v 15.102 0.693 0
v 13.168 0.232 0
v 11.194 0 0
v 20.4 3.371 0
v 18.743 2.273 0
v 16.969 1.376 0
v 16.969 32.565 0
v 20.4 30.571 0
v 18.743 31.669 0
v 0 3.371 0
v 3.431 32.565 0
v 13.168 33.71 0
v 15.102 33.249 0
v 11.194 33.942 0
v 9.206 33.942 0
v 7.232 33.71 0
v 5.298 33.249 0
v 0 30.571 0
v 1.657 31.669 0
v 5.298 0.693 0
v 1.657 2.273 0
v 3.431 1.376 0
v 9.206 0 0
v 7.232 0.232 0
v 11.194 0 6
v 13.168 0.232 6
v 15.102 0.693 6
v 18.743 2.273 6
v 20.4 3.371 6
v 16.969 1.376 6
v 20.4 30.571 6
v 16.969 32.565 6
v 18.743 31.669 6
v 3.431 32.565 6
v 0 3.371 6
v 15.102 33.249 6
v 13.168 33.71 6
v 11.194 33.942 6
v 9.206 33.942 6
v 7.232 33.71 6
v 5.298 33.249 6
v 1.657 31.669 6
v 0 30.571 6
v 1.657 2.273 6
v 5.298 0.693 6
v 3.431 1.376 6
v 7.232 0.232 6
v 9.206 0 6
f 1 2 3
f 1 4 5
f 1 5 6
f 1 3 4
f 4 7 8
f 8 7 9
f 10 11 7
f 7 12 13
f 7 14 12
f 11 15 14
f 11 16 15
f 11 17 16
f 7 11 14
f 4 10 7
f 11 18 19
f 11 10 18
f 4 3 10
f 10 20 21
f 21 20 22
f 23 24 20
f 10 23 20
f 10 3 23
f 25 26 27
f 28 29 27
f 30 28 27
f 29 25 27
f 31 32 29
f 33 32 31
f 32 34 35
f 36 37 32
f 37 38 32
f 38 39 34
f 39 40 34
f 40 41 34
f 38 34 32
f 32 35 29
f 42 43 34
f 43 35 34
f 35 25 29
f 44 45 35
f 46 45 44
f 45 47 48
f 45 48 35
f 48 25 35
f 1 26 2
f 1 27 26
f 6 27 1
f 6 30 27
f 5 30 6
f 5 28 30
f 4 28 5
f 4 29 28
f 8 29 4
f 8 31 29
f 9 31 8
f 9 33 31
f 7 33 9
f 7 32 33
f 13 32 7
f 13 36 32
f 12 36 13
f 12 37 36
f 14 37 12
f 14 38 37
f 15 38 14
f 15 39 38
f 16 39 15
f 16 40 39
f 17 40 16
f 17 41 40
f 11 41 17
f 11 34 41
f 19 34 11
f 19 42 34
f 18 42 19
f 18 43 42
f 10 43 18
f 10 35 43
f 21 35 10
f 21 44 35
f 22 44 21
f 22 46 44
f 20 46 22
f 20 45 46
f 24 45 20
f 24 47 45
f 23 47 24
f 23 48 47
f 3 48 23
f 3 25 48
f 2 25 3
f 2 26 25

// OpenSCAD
$fn = 32;

// ----------------------------------------------------------------------
// Eccentric disc: double_d, 6 mm thick
// ----------------------------------------------------------------------

// --- parameters (mm) ---
profile_height = 6;       // extrusion height
profile_points = 24;      // points of the closed outline

profile = [[20.4, 30.571], [18.743, 31.669], [16.969, 32.565], [15.102, 33.249], [13.168, 33.71], [11.194, 33.942], [9.206, 33.942], [7.232, 33.71], [5.298, 33.249], [3.431, 32.565], [1.657, 31.669], [0, 30.571], [0, 3.371], [1.657, 2.273], [3.431, 1.376], [5.298, 0.693], [7.232, 0.232], [9.206, 0], [11.194, 0], [13.168, 0.232], [15.102, 0.693], [16.969, 1.376], [18.743, 2.273], [20.4, 3.371]];  // single closed polygon, 24 points, counter clockwise

// --- the one profile operation ---
linear_extrude(height = profile_height) polygon(points = profile);
